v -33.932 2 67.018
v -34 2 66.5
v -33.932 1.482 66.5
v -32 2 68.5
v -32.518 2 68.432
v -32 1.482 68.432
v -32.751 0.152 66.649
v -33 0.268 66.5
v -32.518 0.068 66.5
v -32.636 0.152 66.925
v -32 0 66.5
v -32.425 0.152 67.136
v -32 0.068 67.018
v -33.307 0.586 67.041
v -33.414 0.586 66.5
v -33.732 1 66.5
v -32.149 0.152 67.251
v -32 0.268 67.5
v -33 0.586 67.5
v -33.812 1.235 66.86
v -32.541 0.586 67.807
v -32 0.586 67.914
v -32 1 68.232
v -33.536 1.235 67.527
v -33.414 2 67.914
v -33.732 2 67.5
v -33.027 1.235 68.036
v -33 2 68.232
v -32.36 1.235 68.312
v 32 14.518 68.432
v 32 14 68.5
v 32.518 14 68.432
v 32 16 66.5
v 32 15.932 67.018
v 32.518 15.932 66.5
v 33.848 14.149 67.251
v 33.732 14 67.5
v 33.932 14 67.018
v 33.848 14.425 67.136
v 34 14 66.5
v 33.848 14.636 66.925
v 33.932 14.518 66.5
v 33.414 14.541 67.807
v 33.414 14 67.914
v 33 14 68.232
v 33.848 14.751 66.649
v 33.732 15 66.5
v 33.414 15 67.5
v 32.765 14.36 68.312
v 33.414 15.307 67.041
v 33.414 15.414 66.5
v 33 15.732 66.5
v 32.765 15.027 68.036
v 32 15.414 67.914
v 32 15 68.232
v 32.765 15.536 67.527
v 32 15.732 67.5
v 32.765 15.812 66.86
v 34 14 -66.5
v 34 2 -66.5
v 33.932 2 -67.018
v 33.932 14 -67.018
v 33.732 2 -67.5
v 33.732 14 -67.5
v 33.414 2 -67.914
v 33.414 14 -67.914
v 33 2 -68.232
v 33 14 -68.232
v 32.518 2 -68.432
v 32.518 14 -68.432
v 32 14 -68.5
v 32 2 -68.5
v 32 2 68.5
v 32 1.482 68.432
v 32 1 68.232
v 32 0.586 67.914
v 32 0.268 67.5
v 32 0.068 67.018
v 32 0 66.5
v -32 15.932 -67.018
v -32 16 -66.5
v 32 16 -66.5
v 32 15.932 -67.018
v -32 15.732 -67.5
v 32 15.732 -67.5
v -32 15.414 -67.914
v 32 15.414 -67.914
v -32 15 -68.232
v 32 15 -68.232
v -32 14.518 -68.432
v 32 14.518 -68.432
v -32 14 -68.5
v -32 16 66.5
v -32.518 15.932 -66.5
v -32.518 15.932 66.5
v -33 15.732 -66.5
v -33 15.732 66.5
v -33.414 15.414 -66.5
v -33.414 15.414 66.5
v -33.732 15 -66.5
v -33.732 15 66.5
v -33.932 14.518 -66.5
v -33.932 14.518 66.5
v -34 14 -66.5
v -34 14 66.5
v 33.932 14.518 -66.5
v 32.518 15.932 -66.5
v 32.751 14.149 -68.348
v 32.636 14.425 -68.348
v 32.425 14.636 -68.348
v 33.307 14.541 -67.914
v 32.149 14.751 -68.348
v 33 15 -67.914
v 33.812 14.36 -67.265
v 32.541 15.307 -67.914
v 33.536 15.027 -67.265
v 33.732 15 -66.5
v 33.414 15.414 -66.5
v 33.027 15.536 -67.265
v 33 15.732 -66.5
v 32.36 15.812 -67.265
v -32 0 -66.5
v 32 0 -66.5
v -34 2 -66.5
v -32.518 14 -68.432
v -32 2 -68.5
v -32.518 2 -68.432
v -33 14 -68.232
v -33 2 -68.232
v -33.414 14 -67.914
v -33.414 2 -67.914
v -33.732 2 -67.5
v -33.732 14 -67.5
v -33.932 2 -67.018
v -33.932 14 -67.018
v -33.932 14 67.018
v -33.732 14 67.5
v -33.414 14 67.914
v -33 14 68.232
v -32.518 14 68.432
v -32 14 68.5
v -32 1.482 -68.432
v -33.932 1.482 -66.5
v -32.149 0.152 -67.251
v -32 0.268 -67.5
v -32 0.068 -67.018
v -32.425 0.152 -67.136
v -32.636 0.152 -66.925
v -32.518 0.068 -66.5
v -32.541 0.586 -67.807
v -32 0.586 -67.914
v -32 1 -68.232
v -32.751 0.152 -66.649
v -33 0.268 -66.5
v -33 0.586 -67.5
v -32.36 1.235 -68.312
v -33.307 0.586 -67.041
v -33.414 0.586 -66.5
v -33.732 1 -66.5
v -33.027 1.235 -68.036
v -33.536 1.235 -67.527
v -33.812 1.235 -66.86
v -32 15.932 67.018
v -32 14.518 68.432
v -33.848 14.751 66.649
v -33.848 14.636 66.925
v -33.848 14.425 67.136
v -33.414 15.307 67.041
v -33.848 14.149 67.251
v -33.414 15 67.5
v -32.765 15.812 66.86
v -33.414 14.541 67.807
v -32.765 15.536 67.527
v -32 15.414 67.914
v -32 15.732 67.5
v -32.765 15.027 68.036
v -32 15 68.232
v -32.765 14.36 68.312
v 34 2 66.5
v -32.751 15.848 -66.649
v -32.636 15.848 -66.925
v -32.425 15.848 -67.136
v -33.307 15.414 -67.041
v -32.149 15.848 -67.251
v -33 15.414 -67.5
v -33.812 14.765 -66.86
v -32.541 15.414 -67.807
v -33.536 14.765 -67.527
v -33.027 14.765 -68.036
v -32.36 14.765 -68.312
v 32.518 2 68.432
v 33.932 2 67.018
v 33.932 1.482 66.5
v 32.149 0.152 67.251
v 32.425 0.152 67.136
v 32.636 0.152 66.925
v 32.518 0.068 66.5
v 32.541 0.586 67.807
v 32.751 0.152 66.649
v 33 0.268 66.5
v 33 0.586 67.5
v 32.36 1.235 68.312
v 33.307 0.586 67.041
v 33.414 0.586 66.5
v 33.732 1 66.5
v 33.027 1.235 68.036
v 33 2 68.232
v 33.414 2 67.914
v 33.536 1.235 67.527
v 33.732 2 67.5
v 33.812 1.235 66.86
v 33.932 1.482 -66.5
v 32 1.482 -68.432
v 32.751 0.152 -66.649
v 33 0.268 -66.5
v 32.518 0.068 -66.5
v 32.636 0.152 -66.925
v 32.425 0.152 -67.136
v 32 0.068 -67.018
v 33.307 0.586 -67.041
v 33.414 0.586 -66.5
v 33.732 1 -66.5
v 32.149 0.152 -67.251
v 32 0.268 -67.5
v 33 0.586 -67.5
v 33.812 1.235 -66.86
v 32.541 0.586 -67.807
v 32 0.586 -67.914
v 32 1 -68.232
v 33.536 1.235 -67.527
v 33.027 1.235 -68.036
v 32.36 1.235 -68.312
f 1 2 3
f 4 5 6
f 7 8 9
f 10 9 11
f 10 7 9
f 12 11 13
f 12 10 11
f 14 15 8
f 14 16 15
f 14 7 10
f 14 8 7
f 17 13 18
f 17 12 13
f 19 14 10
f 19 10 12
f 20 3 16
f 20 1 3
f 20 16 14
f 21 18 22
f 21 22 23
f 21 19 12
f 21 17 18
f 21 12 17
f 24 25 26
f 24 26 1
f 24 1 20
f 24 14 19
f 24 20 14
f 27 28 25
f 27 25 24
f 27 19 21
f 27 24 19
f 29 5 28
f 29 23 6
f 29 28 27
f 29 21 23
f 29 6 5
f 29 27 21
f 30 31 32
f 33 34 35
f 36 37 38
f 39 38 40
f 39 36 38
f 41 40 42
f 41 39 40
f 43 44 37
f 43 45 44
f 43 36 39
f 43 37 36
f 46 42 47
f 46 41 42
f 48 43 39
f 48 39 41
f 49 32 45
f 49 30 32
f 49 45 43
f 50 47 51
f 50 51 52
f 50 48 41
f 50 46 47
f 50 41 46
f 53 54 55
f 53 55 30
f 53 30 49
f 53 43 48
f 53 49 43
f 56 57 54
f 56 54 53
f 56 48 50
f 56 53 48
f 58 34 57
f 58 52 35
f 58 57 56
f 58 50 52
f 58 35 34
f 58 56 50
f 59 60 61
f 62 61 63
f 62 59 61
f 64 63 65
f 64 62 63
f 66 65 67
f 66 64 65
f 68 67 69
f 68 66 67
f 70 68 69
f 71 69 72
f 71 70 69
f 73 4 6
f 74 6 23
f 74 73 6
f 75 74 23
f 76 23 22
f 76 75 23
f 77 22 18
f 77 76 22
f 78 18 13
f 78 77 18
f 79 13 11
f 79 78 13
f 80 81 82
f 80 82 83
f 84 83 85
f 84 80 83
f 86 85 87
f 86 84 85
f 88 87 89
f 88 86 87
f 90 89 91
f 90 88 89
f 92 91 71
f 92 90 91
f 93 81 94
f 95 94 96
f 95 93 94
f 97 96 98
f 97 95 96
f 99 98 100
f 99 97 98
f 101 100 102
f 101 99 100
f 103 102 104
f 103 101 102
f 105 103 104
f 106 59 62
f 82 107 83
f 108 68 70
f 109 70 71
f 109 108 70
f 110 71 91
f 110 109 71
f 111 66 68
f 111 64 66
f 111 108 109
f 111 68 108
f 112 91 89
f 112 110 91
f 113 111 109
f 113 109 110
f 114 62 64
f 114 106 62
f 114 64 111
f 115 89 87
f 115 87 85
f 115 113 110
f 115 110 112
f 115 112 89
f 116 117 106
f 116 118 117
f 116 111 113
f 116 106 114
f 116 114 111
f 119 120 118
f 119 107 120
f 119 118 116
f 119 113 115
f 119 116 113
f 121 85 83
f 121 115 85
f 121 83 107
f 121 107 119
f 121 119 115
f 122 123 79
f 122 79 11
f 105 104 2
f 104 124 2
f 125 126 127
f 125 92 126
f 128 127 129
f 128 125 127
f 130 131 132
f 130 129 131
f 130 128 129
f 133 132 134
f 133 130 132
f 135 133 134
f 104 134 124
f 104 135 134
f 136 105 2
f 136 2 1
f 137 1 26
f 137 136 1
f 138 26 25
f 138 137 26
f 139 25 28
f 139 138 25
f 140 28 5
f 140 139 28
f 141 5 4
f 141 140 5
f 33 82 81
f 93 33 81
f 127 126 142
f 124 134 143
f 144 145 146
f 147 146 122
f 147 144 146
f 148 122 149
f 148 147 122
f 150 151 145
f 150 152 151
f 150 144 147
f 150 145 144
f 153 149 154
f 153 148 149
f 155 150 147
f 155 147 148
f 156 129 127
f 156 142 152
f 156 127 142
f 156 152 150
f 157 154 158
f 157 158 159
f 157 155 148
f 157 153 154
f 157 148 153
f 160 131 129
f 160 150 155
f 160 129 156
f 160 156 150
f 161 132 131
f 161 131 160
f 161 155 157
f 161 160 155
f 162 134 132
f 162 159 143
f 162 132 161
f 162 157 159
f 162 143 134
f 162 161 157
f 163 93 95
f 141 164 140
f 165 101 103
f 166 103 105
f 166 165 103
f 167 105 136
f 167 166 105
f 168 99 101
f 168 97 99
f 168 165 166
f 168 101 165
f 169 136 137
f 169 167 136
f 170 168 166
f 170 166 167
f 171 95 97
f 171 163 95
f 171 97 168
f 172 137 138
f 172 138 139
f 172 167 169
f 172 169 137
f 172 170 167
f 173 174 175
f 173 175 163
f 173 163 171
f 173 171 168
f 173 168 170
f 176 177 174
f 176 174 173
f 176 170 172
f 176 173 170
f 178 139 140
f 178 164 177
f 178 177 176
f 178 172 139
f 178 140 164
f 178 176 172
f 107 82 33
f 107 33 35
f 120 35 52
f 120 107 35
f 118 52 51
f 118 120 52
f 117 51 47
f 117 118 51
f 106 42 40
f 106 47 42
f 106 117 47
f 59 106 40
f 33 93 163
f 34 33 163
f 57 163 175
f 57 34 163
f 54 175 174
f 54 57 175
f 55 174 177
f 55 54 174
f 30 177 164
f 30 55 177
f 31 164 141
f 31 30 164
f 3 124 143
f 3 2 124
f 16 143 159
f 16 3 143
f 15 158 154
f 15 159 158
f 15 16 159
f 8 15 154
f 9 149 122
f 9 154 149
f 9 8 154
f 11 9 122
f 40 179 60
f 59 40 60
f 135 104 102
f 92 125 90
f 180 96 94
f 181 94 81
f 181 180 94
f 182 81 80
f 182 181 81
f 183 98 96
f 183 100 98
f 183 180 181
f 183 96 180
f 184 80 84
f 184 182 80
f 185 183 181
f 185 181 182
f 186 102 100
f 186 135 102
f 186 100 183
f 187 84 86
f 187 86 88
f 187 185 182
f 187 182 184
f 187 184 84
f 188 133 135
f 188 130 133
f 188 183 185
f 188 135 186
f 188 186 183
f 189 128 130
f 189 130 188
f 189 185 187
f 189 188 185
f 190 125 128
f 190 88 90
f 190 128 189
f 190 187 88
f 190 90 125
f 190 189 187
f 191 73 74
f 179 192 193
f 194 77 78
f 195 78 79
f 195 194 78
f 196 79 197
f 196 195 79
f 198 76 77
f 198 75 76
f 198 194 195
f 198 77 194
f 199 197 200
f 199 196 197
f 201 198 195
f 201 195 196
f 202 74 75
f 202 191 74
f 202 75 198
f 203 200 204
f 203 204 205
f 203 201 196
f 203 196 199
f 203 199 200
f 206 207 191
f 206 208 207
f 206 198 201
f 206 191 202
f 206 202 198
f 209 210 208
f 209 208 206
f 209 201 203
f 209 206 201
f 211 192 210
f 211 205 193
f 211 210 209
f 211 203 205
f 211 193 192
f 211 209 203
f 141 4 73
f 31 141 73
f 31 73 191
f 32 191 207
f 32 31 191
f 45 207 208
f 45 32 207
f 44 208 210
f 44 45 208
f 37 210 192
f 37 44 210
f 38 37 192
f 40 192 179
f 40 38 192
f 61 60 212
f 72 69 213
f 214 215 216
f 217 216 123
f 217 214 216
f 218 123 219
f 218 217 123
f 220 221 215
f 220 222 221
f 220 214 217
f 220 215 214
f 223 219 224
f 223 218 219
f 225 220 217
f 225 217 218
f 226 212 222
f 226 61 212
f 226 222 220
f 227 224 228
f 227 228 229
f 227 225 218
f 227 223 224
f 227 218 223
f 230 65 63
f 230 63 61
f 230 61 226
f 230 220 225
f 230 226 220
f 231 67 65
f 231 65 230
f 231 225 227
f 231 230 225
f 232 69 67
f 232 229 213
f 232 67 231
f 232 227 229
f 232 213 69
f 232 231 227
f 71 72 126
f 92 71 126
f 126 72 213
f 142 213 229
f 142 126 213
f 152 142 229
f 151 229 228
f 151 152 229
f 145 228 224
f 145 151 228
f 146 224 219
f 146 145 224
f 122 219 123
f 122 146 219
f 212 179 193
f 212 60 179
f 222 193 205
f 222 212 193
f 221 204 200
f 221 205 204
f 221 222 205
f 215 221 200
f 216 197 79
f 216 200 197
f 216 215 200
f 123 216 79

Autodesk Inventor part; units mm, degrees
ref_plane "YZ Plane" through (0, 0, 0) normal (1, 0, 0) x (0, 1, 0)
ref_plane "XZ Plane" through (0, 0, 0) normal (0, 1, 0) x (-1, 0, 0)
ref_plane "XY Plane" through (0, 0, 0) normal (0, 0, 1) x (1, 0, 0)
sketch "Sketch1" plane through (0, 0, 0) normal (0, 1, 0) x (-1, 0, 0)
  line L0 (34, 68.5) -> (-34, 68.5)
  line L1 (-34, 68.5) -> (-34, -68.5)
  line L2 (-34, -68.5) -> (34, -68.5)
  line L3 (34, -68.5) -> (34, 68.5)
  line L4 (34, 68.5) -> (-34, -68.5) construction
  line L5 (-34, 68.5) -> (34, -68.5) construction
  point P0 (0, 0)
  dimension "d0" = 68
  dimension "d1" = 137
extrude "Extrusion1" add sketch "Sketch1" along normal blind 16
fillet "Fillet1" radius 2 3 edges at (0, 16, 68.5) (34, 16, 0) (34, 8, 68.5)
fillet "Fillet1" radius 2 12 edges at (-34, 8, 68.5) (34, 8, 68.5) (0, 0, 68.5) (0, 16, 68.5) (-34, 8, -68.5) (-34, 0, 0) (-34, 16, 0) (34, 8, -68.5) (0, 0, -68.5) (0, 16, -68.5) (34, 0, 0) (34, 16, 0)
properties part number "Battery_Large"
